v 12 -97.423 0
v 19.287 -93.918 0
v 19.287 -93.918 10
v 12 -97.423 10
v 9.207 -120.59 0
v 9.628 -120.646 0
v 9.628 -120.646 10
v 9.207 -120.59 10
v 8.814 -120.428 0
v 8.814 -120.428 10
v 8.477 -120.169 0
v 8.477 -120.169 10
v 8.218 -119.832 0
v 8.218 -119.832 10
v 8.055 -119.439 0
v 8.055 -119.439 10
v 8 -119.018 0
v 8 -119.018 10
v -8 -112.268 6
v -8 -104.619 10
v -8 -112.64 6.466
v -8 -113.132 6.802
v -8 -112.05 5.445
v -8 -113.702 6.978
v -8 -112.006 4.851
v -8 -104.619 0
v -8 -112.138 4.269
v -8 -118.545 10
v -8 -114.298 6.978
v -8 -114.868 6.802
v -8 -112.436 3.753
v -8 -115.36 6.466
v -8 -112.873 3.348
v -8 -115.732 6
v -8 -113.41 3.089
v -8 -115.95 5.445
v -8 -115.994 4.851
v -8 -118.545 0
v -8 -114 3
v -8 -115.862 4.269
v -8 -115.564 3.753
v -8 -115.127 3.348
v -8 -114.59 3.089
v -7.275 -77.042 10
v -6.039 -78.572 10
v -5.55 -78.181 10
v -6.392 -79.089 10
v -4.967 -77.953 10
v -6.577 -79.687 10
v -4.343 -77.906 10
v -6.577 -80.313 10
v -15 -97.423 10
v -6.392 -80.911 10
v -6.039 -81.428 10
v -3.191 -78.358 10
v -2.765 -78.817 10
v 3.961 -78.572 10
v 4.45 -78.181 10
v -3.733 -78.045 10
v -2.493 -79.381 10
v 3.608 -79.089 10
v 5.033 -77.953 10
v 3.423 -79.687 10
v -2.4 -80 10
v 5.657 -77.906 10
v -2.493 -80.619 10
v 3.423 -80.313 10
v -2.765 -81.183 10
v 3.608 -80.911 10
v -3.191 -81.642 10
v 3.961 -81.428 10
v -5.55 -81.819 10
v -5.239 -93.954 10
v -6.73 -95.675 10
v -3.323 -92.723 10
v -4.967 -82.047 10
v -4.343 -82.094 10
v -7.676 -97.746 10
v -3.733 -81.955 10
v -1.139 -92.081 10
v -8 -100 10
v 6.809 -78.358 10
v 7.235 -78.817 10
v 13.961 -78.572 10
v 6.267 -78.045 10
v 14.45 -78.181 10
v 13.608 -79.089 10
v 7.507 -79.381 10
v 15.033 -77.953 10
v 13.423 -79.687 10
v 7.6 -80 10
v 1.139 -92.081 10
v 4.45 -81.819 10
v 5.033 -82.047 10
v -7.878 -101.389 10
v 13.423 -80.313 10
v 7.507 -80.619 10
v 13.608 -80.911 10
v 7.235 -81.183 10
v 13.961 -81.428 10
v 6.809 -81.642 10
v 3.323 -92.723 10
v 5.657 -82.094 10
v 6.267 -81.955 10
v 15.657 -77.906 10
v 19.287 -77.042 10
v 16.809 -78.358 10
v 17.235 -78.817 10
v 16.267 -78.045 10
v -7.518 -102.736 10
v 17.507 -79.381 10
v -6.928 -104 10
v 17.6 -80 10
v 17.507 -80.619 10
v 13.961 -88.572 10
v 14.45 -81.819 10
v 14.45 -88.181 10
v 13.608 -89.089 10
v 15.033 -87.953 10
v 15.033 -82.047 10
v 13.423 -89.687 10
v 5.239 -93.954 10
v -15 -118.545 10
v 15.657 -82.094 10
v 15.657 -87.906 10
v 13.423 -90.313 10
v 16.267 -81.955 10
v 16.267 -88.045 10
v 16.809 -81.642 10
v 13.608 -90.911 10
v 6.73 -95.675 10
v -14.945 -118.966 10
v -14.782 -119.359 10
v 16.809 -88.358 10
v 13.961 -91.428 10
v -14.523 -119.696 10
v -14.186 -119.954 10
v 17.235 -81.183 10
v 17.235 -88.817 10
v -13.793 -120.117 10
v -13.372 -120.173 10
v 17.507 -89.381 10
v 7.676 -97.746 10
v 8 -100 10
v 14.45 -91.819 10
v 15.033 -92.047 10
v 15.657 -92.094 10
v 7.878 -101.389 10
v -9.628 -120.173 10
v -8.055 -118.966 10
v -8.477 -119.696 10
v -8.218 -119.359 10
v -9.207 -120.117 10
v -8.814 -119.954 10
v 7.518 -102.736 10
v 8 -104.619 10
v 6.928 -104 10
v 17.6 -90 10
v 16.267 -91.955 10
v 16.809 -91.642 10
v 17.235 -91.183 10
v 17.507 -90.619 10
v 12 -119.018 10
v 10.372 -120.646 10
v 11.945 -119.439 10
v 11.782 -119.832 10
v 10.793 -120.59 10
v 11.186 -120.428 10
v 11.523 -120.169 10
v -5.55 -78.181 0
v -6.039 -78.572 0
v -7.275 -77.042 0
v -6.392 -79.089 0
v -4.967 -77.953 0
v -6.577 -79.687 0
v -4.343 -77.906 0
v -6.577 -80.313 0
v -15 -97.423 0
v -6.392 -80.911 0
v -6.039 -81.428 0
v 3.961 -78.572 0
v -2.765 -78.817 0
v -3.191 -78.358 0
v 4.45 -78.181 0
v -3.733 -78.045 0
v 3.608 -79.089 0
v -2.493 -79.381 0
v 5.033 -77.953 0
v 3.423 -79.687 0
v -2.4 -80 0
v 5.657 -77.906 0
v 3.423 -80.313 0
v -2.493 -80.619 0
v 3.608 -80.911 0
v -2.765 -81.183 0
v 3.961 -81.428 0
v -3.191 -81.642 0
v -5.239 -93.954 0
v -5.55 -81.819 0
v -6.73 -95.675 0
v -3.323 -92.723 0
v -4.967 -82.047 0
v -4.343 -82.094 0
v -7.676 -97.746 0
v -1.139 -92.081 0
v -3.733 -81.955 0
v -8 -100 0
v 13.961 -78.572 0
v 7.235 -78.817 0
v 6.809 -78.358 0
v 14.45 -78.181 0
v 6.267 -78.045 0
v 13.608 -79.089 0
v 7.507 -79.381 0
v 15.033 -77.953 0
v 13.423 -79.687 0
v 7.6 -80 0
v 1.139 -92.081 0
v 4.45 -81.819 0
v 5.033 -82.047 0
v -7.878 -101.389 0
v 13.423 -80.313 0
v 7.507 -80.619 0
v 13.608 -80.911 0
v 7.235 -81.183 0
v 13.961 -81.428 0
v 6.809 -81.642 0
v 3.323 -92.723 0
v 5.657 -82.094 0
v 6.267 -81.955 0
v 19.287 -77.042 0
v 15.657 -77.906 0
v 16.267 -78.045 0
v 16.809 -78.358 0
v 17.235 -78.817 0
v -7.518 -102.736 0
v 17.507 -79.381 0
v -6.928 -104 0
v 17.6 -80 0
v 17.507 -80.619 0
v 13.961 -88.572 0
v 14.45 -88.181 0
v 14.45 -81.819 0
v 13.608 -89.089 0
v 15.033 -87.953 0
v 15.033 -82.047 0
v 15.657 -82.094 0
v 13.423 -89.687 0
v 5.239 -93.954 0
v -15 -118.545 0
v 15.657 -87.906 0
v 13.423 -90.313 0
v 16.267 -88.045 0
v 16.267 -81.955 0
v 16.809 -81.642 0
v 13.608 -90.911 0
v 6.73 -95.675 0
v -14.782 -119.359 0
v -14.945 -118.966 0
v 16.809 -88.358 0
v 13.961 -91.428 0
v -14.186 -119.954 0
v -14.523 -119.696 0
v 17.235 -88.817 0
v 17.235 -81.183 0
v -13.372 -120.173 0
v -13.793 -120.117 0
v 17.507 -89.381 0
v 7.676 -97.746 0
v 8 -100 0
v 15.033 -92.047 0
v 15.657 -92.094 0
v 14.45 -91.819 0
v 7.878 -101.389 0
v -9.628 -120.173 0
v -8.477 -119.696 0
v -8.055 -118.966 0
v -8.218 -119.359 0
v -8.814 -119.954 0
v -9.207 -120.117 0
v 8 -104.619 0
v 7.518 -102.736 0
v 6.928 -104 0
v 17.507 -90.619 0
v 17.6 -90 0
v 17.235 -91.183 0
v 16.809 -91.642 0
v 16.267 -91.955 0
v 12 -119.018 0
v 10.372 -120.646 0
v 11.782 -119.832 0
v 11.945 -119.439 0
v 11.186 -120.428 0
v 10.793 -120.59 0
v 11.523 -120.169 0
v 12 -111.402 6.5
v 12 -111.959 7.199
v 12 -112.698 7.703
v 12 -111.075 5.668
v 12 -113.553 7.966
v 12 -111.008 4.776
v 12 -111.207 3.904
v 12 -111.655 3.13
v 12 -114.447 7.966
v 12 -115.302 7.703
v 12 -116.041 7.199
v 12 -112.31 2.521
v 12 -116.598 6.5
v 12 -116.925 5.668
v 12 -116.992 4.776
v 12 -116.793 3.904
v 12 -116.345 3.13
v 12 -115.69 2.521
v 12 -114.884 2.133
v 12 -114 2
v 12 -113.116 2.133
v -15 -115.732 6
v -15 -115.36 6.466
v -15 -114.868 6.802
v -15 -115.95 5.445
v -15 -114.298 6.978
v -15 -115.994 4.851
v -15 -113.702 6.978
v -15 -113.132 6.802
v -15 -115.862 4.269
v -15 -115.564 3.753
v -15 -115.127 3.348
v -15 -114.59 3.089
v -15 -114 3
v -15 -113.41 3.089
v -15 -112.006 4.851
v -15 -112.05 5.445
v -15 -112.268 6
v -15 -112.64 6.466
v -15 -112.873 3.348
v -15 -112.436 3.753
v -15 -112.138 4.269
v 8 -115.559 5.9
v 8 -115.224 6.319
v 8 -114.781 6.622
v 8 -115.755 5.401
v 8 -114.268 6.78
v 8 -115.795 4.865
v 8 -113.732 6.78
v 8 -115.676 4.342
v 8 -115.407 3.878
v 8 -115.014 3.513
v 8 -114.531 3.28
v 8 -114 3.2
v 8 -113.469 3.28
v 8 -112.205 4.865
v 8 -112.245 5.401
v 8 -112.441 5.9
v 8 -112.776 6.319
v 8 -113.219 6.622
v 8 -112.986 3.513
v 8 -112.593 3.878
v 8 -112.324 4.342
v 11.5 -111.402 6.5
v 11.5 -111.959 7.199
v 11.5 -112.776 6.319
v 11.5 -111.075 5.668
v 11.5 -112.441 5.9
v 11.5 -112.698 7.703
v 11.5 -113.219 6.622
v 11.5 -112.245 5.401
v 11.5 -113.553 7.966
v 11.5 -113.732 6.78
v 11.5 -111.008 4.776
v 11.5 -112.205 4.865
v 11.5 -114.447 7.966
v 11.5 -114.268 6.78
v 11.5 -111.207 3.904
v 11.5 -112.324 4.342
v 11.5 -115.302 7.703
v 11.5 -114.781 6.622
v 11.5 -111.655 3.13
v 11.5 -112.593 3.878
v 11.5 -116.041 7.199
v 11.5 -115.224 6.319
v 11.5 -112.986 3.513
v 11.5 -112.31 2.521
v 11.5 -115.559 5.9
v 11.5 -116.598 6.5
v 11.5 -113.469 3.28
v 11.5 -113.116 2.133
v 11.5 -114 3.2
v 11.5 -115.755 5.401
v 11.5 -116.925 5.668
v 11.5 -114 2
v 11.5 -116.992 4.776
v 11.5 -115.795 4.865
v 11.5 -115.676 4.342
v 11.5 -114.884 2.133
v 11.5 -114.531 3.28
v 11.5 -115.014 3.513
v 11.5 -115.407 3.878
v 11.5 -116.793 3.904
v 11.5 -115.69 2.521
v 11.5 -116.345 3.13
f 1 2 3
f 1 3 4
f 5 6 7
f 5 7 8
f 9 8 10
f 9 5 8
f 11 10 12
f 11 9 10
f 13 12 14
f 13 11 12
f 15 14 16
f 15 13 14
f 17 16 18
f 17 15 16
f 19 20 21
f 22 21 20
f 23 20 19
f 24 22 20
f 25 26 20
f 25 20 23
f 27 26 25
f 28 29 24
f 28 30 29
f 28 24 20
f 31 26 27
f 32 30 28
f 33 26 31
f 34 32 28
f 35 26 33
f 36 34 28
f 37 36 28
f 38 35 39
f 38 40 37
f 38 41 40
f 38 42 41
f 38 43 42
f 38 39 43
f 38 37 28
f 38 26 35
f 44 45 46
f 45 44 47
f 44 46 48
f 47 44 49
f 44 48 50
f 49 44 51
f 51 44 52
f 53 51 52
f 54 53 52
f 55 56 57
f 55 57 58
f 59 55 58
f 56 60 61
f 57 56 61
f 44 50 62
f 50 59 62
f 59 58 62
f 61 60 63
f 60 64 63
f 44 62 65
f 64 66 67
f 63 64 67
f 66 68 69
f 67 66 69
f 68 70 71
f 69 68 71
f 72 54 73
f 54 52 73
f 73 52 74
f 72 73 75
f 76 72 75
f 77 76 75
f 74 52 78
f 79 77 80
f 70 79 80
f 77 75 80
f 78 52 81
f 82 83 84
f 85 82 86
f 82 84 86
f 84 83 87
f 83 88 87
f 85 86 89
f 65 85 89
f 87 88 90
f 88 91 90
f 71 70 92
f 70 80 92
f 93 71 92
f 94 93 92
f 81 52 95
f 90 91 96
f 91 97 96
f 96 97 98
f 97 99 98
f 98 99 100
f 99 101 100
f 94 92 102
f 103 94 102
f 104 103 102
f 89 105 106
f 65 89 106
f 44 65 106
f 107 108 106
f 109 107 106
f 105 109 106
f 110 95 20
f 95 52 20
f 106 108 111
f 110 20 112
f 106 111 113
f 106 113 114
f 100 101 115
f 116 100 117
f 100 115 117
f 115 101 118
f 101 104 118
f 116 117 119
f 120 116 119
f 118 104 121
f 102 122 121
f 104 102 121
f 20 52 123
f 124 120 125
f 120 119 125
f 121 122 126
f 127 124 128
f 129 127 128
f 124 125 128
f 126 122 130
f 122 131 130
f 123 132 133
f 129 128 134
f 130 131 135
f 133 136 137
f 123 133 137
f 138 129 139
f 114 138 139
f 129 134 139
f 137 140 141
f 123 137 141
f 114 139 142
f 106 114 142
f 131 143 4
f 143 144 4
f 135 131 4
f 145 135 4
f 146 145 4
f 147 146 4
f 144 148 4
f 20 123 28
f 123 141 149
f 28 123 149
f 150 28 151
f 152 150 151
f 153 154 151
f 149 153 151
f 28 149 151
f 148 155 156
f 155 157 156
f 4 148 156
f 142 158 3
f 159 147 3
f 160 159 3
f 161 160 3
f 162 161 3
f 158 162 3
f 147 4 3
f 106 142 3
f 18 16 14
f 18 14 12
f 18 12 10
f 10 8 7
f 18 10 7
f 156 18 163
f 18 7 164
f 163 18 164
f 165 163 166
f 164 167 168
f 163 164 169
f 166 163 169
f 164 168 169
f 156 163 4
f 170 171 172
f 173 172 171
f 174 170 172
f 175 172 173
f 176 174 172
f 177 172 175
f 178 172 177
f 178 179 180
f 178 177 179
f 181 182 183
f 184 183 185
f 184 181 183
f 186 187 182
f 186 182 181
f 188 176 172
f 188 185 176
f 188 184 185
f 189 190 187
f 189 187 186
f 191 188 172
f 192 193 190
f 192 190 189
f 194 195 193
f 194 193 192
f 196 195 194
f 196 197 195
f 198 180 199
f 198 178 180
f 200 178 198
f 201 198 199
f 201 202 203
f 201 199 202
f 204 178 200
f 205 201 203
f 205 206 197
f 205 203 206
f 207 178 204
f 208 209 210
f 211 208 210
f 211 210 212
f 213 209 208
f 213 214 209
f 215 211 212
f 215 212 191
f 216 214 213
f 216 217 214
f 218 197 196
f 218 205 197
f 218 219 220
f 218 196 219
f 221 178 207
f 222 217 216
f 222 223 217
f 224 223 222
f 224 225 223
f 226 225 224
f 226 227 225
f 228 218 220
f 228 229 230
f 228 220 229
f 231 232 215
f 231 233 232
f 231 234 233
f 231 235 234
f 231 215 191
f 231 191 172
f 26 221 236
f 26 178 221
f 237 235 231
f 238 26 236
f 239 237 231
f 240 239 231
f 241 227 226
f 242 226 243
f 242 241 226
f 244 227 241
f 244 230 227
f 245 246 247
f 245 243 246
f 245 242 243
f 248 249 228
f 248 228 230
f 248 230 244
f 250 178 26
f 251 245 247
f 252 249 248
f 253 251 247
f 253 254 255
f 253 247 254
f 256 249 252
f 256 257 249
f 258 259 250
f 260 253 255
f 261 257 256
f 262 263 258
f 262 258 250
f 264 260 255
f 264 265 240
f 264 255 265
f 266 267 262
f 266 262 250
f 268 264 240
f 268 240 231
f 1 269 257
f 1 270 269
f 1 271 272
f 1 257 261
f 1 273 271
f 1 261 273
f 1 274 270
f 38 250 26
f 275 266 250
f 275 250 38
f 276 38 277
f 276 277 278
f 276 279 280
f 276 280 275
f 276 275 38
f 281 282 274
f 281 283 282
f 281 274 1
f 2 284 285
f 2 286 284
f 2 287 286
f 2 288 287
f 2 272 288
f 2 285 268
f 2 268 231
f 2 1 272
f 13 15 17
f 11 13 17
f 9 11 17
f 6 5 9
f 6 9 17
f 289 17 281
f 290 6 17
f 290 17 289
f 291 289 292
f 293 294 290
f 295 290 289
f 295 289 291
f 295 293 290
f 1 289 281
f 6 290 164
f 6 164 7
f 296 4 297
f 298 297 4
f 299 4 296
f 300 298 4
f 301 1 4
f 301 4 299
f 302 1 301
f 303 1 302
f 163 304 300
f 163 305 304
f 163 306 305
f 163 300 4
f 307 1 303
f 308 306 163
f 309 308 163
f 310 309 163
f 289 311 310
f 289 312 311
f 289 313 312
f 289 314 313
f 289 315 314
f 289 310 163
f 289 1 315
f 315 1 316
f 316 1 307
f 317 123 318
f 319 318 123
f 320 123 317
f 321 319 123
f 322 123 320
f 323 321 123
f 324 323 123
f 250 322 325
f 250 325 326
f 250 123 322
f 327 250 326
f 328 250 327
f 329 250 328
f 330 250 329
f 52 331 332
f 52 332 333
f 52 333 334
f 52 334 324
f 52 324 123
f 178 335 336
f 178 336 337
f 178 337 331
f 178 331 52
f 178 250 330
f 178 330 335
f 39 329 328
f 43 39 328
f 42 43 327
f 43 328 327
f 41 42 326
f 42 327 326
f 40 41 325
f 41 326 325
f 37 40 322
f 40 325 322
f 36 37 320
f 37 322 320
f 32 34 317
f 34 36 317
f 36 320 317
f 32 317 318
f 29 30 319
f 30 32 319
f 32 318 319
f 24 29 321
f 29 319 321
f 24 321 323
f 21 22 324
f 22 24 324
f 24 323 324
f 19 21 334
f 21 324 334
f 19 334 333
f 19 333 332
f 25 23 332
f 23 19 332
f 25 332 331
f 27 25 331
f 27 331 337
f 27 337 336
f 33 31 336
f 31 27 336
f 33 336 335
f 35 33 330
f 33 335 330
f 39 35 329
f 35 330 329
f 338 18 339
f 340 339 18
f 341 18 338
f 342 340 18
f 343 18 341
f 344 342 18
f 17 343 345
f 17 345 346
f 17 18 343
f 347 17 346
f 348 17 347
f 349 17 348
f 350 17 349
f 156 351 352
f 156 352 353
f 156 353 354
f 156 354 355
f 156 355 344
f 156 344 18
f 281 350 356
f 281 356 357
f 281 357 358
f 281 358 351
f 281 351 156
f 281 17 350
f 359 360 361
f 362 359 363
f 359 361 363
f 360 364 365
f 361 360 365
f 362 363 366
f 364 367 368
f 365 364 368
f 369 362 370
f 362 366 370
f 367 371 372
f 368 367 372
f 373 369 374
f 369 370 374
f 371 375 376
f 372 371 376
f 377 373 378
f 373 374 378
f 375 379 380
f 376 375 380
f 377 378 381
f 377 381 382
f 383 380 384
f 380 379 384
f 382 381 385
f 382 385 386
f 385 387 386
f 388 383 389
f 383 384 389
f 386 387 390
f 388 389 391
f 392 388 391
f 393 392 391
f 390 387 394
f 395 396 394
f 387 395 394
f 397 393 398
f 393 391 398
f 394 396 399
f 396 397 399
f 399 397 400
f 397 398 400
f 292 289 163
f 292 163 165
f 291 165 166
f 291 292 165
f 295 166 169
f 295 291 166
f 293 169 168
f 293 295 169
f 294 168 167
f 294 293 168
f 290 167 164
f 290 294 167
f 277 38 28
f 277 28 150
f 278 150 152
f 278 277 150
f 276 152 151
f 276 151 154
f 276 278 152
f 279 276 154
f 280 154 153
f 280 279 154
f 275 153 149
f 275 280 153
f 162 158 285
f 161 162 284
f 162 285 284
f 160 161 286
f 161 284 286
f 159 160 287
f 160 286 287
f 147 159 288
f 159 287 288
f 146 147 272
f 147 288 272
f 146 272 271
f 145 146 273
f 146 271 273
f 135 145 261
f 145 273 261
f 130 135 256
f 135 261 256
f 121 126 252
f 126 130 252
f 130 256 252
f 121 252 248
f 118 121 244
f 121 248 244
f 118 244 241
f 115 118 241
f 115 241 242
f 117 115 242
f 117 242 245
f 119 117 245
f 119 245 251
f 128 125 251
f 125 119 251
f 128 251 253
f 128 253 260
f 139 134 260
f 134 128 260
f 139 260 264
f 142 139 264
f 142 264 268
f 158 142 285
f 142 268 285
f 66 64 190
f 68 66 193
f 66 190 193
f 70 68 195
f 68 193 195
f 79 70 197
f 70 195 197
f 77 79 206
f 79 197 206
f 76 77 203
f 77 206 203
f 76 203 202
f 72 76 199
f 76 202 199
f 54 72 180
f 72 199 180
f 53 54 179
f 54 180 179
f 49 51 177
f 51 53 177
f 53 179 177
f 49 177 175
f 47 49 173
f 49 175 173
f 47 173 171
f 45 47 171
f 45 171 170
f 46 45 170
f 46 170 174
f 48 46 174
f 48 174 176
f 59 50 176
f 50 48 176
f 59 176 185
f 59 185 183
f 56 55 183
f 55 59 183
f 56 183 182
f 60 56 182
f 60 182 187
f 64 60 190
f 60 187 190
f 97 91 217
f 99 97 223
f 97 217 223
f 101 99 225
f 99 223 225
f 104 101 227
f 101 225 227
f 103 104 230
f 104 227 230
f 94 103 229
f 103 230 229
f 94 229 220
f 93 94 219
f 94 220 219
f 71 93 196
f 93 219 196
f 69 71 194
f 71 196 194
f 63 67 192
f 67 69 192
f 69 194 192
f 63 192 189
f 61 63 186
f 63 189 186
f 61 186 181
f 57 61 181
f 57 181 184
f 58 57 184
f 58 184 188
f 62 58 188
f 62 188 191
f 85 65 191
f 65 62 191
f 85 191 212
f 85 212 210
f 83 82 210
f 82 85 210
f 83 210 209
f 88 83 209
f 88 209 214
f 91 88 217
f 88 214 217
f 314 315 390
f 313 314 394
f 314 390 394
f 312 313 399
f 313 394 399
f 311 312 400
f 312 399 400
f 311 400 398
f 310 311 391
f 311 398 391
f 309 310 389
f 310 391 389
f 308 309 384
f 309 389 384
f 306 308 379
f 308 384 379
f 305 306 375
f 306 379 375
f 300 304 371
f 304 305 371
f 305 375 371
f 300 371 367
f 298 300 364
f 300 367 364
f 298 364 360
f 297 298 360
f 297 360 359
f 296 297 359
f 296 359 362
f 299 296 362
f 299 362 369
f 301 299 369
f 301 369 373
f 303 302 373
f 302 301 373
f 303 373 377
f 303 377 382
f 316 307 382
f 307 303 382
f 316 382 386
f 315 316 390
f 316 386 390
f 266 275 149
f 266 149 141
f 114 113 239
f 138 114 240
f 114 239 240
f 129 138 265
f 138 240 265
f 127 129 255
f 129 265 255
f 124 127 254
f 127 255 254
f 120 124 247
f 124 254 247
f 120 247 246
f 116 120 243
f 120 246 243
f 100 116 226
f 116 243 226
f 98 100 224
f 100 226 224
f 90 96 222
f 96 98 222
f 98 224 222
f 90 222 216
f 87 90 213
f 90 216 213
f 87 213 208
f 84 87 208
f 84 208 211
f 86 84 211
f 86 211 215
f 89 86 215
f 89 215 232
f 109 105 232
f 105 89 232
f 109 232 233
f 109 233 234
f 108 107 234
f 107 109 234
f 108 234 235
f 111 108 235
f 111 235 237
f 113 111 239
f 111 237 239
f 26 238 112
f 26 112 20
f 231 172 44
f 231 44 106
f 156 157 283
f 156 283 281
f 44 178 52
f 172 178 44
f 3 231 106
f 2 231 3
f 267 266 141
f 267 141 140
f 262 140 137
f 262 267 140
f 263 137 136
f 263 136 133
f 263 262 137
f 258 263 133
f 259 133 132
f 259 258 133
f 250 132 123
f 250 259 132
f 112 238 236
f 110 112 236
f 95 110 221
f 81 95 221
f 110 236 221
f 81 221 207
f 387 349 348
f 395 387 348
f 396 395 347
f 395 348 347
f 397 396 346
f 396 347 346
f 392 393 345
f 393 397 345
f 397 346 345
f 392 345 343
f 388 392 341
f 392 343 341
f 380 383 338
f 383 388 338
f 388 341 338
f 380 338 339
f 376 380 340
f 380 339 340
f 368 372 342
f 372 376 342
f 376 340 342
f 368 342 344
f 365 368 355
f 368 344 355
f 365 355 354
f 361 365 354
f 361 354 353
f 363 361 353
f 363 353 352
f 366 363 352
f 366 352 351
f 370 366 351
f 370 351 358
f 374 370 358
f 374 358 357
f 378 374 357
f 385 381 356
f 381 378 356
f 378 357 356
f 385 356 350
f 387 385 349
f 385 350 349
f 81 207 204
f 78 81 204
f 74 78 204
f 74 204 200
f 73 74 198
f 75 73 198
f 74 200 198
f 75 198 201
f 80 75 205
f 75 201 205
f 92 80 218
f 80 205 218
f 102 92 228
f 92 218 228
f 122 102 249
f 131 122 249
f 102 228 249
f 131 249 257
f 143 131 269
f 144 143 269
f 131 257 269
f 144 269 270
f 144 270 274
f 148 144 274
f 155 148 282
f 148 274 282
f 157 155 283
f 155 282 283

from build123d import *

# Parameters (mm, degrees)
CYLINDER011012_R               = 1.8
CYLINDER011012_DEPTH           = 20
CYLINDER011013_R               = 3
CYLINDER011013_DEPTH           = 20
BOX010_W                       = 20
BOX010_H                       = 10
BOX010_DEPTH                   = 20
CYLINDER011029_R               = 2.1
CYLINDER011029_DEPTH           = 20
ARRAY017_X_COUNT               = 4
ARRAY017_X_PITCH               = 10
ARRAY017_Y_COUNT               = 2
ARRAY017_Y_PITCH               = 10
CYLINDER011011_R               = 2
CYLINDER011011_DEPTH           = 20
CYLINDER011014_R               = 8
CYLINDER011014_DEPTH           = 10
CYLINDER011015_W               = 11
CYLINDER011015_H               = 10
CYLINDER011015_ANGLE           = 240
CYLINDER011015_PLACEMENT_ANGLE = 150
PAD_DEPTH                      = 10


with BuildPart() as bolt_hole001:
    # Cylinder011012 → Cylinder011012 (new body)
    with BuildSketch(Plane(origin=(-1, 14, 5), x_dir=(0, 0, -1), z_dir=(1, 0, 0))):
        Circle(CYLINDER011012_R)
    extrude(amount=CYLINDER011012_DEPTH)


with BuildPart() as bolt_head_hole:
    # Cylinder011013 → Cylinder011013 (new body)
    with BuildSketch(Plane(origin=(11.5, 14, 5), x_dir=(0, 0, -1), z_dir=(1, 0, 0))):
        Circle(CYLINDER011013_R)
    extrude(amount=CYLINDER011013_DEPTH)


with BuildPart() as cube:
    # Box010 → Box010 (new body)
    with BuildSketch(Plane(origin=(-9, -14, 0), x_dir=(1, 0, 0), z_dir=(0, 0, 1))):
        with Locations((10, 5)):
            Rectangle(BOX010_W, BOX010_H)
    extrude(amount=BOX010_DEPTH)


with BuildPart() as general_insert_hole_array_cut:
    # Cylinder011029 → Cylinder011029 (new body)
    with BuildSketch(Plane.XY):
        Circle(CYLINDER011029_R)
    extrude(amount=CYLINDER011029_DEPTH)

    # Array017 X: general insert hole array cut ×4


with BuildPart() as general_insert_hole_array_cut_1:
    add(general_insert_hole_array_cut.part)
    with Locations(*[(i * ARRAY017_X_PITCH, 0, 0) for i in range(1, ARRAY017_X_COUNT)]):
        add(general_insert_hole_array_cut.part)

    # Array017 Y: general insert hole array cut ×2


with BuildPart() as general_insert_hole_array_cut_2:
    add(general_insert_hole_array_cut_1.part)
    with Locations(*[(0, i * ARRAY017_Y_PITCH, 0) for i in range(1, ARRAY017_Y_COUNT)]):
        add(general_insert_hole_array_cut_1.part)


with BuildPart() as general_insert_hole_array_cut_3:
    # Array017 placement: moved
    add(general_insert_hole_array_cut_2.part.moved(Location((-4.5, -20, 0))))

    # Cut023015009020: cut Cube
    add(cube.part, mode=Mode.SUBTRACT)


with BuildPart() as shaft_attachment_hole_fusion:
    # Cylinder011011 → Cylinder011011 (new body)
    with BuildSketch(Plane(origin=(-22, 14, 5), x_dir=(0, 0, -1), z_dir=(1, 0, 0))):
        Circle(CYLINDER011011_R)
    extrude(amount=CYLINDER011011_DEPTH)

    # Fusion004: union bolt hole001, bolt head hole, general insert hole array cut
    add(bolt_hole001.part)
    add(bolt_head_hole.part)
    add(general_insert_hole_array_cut_3.part)


with BuildPart() as cylinder:
    # Cylinder011014 → Cylinder011014 (new body)
    with BuildSketch(Plane.XY):
        Circle(CYLINDER011014_R)
    extrude(amount=CYLINDER011014_DEPTH)


with BuildPart() as cut023015009010:
    # Cylinder011015 → Cylinder011015 (revolve)
    with BuildSketch(Plane.XZ):
        with Locations((5.5, 5)):
            Rectangle(CYLINDER011015_W, CYLINDER011015_H)
    revolve(axis=Axis((0, 0, 0), (0, 0, 1)), revolution_arc=CYLINDER011015_ANGLE)


with BuildPart() as cut023015009010_1:
    # Cylinder011015 placement: moved
    add(cut023015009010.part.rotate(Axis((0, 0, 0), (0, 0, 1)), CYLINDER011015_PLACEMENT_ANGLE))

    # Cut023015009010: cut Cylinder
    add(cylinder.part, mode=Mode.SUBTRACT)


with BuildPart() as shaft_attachment_cut:
    # Sketch002 → Pad (new body)
    with BuildSketch(Plane.XY):
        with BuildLine():
            Line((12, -2.57721), (12, 19.017869))
            ThreePointArc((12, 19.017869), (11.523224, 20.168908), (10.372186, 20.645684))
            Line((10.372186, 20.645684), (9.627814, 20.645684))
            ThreePointArc((9.627814, 20.645684), (8.476776, 20.168908), (8, 19.017869))
            Line((8, 19.017869), (8, 0))
            ThreePointArc((-8, 0), (0, -8), (8, 0))
            Line((-8, 0), (-8, 18.544726))
            ThreePointArc((-8, 18.544726), (-8.476776, 19.695765), (-9.627814, 20.17254))
            Line((-9.627814, 20.17254), (-13.372186, 20.17254))
            ThreePointArc((-13.372186, 20.17254), (-14.523224, 19.695765), (-15, 18.544726))
            Line((-15, 18.544726), (-15, -2.57721))
            Line((-15, -2.57721), (-7.274933, -22.958025))
            Line((-7.274933, -22.958025), (19.286886, -22.958025))
            Line((19.286886, -22.958025), (19.286886, -6.082279))
            Line((19.286886, -6.082279), (12, -2.57721))
        make_face()
    extrude(amount=PAD_DEPTH)

    # Fusion005: union Cut023015009010
    add(cut023015009010_1.part)

    # Cut023015009009: cut shaft attachment hole fusion
    add(shaft_attachment_hole_fusion.part, mode=Mode.SUBTRACT)


with BuildPart() as part_mirroring001:
    # Part__Mirroring001: instance of shaft attachment  cut
    add(shaft_attachment_cut.part.mirror(Plane(origin=(0, -50, 0), x_dir=(1, 0, 0), z_dir=(0, 1, 0))))


solid = part_mirroring001.part
